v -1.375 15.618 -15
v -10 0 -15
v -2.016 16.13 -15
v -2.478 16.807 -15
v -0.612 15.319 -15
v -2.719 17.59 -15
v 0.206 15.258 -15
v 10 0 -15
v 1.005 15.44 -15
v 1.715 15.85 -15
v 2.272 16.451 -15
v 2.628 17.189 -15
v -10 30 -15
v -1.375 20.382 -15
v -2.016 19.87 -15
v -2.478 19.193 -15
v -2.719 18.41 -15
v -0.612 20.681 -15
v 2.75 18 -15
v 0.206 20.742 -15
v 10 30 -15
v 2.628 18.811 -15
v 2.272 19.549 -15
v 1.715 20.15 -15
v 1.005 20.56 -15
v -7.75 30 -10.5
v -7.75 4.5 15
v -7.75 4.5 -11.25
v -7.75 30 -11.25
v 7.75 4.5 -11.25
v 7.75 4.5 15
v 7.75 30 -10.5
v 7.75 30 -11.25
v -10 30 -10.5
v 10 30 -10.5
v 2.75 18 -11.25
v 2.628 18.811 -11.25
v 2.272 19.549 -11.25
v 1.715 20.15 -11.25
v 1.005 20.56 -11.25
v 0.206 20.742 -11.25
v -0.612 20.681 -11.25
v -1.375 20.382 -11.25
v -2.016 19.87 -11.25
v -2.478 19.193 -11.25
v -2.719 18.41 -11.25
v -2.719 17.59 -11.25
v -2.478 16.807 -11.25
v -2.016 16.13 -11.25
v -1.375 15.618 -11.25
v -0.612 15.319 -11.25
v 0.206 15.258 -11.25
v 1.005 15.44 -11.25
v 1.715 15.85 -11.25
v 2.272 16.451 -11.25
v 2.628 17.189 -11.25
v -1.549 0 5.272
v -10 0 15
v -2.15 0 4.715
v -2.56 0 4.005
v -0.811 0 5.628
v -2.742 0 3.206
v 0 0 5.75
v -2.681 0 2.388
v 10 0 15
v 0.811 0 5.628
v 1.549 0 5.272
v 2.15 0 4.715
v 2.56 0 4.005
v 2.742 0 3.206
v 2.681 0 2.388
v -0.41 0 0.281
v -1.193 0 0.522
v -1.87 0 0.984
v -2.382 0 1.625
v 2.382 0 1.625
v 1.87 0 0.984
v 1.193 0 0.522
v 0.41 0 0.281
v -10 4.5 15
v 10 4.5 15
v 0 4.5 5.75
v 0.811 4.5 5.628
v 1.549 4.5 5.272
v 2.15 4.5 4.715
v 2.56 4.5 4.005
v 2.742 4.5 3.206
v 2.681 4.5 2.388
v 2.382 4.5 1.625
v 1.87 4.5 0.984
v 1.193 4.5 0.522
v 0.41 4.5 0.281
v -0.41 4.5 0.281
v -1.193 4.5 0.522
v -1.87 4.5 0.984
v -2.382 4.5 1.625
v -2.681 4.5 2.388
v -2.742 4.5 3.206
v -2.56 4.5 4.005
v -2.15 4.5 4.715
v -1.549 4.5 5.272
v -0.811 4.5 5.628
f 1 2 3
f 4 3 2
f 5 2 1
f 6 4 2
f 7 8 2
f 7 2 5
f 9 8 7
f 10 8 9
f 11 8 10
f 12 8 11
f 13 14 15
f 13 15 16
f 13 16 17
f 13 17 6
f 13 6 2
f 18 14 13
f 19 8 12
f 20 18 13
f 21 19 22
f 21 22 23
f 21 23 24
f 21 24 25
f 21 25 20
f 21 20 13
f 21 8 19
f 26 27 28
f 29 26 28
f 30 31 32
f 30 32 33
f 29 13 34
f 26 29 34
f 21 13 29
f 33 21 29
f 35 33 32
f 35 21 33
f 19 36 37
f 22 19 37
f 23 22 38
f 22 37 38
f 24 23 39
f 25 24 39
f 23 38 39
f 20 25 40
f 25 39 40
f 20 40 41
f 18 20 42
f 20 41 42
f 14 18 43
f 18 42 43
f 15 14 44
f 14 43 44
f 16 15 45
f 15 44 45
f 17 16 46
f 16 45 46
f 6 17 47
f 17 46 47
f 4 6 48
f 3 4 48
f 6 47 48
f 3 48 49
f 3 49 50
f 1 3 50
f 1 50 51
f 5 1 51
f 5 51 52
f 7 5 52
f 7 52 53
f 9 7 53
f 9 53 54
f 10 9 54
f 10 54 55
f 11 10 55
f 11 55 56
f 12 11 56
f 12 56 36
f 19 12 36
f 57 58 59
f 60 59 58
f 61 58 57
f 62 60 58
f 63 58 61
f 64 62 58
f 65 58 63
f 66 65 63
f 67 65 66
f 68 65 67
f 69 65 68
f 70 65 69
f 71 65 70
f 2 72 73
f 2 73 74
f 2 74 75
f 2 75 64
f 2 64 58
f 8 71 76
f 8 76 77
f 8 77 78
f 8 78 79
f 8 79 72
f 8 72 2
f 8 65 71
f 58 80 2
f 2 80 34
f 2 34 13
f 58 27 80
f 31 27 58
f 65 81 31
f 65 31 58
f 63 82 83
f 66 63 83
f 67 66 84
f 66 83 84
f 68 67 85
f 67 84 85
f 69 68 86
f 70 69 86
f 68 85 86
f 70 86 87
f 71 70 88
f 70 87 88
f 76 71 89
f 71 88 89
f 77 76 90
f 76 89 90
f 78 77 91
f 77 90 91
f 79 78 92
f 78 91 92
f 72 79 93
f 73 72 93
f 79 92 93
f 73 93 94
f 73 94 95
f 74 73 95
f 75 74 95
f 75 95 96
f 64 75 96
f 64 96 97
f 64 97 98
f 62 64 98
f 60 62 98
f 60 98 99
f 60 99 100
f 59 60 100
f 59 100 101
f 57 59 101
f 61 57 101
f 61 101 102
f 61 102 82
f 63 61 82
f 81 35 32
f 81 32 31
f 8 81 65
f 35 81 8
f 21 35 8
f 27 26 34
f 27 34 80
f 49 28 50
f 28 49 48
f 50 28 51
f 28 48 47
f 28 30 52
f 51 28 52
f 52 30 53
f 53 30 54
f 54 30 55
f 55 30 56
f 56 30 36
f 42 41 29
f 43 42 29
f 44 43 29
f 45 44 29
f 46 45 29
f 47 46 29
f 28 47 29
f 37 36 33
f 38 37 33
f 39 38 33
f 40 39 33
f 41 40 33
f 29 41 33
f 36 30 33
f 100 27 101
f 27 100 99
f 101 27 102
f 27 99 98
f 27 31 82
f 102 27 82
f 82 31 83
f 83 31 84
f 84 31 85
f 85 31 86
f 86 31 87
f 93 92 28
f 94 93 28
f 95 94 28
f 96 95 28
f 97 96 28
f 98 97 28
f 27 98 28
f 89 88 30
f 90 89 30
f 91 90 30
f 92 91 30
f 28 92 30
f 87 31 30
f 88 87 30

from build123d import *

# Parameters (mm, degrees)
BOSS_EXTRUDE1_DEPTH = 10
CUT_EXTRUDE1_DEPTH  = 7.75
SKETCH3_R           = 2.75
CUT_EXTRUDE2_DEPTH  = 15.5
SKETCH4_R           = 2.75
CUT_EXTRUDE3_DEPTH  = 15.5


with BuildPart() as part:
    # Sketch1 → Boss-Extrude1 (new, symmetric)
    with BuildSketch(Plane(origin=(0, 0, 0), x_dir=(0, 0, -1), z_dir=(1, 0, 0))):
        Polygon((-15, 0), (15, 0), (15, 30), (10.5, 30), (-15, 4.5), align=None)
    extrude(amount=BOSS_EXTRUDE1_DEPTH, both=True)

    # Sketch2 → Cut-Extrude1 (cut, symmetric)
    with BuildSketch(Plane(origin=(0, 0, 0), x_dir=(0, 0, -1), z_dir=(1, 0, 0))):
        Polygon((-11.25, 4.5), (11.25, 4.5), (11.25, 26.129344049), (11.25, 30), (10.5, 30), (-15, 4.5), align=None)
    extrude(amount=CUT_EXTRUDE1_DEPTH, both=True, mode=Mode.SUBTRACT)

    # Sketch3 → Cut-Extrude2 (cut)
    with BuildSketch(Plane.XY.offset(-11.25)):
        with Locations((0, 18)):
            Circle(SKETCH3_R)
    extrude(amount=-CUT_EXTRUDE2_DEPTH, mode=Mode.SUBTRACT)

    # Sketch4 → Cut-Extrude3 (cut)
    with BuildSketch(Plane(origin=(0, 4.5, 0), x_dir=(1, 0, 0), z_dir=(0, 1, 0))):
        with Locations(Location((0, -3, 0), (0, 0, 270))):
            Circle(SKETCH4_R)
    extrude(amount=-CUT_EXTRUDE3_DEPTH, mode=Mode.SUBTRACT)


solid = part.part
